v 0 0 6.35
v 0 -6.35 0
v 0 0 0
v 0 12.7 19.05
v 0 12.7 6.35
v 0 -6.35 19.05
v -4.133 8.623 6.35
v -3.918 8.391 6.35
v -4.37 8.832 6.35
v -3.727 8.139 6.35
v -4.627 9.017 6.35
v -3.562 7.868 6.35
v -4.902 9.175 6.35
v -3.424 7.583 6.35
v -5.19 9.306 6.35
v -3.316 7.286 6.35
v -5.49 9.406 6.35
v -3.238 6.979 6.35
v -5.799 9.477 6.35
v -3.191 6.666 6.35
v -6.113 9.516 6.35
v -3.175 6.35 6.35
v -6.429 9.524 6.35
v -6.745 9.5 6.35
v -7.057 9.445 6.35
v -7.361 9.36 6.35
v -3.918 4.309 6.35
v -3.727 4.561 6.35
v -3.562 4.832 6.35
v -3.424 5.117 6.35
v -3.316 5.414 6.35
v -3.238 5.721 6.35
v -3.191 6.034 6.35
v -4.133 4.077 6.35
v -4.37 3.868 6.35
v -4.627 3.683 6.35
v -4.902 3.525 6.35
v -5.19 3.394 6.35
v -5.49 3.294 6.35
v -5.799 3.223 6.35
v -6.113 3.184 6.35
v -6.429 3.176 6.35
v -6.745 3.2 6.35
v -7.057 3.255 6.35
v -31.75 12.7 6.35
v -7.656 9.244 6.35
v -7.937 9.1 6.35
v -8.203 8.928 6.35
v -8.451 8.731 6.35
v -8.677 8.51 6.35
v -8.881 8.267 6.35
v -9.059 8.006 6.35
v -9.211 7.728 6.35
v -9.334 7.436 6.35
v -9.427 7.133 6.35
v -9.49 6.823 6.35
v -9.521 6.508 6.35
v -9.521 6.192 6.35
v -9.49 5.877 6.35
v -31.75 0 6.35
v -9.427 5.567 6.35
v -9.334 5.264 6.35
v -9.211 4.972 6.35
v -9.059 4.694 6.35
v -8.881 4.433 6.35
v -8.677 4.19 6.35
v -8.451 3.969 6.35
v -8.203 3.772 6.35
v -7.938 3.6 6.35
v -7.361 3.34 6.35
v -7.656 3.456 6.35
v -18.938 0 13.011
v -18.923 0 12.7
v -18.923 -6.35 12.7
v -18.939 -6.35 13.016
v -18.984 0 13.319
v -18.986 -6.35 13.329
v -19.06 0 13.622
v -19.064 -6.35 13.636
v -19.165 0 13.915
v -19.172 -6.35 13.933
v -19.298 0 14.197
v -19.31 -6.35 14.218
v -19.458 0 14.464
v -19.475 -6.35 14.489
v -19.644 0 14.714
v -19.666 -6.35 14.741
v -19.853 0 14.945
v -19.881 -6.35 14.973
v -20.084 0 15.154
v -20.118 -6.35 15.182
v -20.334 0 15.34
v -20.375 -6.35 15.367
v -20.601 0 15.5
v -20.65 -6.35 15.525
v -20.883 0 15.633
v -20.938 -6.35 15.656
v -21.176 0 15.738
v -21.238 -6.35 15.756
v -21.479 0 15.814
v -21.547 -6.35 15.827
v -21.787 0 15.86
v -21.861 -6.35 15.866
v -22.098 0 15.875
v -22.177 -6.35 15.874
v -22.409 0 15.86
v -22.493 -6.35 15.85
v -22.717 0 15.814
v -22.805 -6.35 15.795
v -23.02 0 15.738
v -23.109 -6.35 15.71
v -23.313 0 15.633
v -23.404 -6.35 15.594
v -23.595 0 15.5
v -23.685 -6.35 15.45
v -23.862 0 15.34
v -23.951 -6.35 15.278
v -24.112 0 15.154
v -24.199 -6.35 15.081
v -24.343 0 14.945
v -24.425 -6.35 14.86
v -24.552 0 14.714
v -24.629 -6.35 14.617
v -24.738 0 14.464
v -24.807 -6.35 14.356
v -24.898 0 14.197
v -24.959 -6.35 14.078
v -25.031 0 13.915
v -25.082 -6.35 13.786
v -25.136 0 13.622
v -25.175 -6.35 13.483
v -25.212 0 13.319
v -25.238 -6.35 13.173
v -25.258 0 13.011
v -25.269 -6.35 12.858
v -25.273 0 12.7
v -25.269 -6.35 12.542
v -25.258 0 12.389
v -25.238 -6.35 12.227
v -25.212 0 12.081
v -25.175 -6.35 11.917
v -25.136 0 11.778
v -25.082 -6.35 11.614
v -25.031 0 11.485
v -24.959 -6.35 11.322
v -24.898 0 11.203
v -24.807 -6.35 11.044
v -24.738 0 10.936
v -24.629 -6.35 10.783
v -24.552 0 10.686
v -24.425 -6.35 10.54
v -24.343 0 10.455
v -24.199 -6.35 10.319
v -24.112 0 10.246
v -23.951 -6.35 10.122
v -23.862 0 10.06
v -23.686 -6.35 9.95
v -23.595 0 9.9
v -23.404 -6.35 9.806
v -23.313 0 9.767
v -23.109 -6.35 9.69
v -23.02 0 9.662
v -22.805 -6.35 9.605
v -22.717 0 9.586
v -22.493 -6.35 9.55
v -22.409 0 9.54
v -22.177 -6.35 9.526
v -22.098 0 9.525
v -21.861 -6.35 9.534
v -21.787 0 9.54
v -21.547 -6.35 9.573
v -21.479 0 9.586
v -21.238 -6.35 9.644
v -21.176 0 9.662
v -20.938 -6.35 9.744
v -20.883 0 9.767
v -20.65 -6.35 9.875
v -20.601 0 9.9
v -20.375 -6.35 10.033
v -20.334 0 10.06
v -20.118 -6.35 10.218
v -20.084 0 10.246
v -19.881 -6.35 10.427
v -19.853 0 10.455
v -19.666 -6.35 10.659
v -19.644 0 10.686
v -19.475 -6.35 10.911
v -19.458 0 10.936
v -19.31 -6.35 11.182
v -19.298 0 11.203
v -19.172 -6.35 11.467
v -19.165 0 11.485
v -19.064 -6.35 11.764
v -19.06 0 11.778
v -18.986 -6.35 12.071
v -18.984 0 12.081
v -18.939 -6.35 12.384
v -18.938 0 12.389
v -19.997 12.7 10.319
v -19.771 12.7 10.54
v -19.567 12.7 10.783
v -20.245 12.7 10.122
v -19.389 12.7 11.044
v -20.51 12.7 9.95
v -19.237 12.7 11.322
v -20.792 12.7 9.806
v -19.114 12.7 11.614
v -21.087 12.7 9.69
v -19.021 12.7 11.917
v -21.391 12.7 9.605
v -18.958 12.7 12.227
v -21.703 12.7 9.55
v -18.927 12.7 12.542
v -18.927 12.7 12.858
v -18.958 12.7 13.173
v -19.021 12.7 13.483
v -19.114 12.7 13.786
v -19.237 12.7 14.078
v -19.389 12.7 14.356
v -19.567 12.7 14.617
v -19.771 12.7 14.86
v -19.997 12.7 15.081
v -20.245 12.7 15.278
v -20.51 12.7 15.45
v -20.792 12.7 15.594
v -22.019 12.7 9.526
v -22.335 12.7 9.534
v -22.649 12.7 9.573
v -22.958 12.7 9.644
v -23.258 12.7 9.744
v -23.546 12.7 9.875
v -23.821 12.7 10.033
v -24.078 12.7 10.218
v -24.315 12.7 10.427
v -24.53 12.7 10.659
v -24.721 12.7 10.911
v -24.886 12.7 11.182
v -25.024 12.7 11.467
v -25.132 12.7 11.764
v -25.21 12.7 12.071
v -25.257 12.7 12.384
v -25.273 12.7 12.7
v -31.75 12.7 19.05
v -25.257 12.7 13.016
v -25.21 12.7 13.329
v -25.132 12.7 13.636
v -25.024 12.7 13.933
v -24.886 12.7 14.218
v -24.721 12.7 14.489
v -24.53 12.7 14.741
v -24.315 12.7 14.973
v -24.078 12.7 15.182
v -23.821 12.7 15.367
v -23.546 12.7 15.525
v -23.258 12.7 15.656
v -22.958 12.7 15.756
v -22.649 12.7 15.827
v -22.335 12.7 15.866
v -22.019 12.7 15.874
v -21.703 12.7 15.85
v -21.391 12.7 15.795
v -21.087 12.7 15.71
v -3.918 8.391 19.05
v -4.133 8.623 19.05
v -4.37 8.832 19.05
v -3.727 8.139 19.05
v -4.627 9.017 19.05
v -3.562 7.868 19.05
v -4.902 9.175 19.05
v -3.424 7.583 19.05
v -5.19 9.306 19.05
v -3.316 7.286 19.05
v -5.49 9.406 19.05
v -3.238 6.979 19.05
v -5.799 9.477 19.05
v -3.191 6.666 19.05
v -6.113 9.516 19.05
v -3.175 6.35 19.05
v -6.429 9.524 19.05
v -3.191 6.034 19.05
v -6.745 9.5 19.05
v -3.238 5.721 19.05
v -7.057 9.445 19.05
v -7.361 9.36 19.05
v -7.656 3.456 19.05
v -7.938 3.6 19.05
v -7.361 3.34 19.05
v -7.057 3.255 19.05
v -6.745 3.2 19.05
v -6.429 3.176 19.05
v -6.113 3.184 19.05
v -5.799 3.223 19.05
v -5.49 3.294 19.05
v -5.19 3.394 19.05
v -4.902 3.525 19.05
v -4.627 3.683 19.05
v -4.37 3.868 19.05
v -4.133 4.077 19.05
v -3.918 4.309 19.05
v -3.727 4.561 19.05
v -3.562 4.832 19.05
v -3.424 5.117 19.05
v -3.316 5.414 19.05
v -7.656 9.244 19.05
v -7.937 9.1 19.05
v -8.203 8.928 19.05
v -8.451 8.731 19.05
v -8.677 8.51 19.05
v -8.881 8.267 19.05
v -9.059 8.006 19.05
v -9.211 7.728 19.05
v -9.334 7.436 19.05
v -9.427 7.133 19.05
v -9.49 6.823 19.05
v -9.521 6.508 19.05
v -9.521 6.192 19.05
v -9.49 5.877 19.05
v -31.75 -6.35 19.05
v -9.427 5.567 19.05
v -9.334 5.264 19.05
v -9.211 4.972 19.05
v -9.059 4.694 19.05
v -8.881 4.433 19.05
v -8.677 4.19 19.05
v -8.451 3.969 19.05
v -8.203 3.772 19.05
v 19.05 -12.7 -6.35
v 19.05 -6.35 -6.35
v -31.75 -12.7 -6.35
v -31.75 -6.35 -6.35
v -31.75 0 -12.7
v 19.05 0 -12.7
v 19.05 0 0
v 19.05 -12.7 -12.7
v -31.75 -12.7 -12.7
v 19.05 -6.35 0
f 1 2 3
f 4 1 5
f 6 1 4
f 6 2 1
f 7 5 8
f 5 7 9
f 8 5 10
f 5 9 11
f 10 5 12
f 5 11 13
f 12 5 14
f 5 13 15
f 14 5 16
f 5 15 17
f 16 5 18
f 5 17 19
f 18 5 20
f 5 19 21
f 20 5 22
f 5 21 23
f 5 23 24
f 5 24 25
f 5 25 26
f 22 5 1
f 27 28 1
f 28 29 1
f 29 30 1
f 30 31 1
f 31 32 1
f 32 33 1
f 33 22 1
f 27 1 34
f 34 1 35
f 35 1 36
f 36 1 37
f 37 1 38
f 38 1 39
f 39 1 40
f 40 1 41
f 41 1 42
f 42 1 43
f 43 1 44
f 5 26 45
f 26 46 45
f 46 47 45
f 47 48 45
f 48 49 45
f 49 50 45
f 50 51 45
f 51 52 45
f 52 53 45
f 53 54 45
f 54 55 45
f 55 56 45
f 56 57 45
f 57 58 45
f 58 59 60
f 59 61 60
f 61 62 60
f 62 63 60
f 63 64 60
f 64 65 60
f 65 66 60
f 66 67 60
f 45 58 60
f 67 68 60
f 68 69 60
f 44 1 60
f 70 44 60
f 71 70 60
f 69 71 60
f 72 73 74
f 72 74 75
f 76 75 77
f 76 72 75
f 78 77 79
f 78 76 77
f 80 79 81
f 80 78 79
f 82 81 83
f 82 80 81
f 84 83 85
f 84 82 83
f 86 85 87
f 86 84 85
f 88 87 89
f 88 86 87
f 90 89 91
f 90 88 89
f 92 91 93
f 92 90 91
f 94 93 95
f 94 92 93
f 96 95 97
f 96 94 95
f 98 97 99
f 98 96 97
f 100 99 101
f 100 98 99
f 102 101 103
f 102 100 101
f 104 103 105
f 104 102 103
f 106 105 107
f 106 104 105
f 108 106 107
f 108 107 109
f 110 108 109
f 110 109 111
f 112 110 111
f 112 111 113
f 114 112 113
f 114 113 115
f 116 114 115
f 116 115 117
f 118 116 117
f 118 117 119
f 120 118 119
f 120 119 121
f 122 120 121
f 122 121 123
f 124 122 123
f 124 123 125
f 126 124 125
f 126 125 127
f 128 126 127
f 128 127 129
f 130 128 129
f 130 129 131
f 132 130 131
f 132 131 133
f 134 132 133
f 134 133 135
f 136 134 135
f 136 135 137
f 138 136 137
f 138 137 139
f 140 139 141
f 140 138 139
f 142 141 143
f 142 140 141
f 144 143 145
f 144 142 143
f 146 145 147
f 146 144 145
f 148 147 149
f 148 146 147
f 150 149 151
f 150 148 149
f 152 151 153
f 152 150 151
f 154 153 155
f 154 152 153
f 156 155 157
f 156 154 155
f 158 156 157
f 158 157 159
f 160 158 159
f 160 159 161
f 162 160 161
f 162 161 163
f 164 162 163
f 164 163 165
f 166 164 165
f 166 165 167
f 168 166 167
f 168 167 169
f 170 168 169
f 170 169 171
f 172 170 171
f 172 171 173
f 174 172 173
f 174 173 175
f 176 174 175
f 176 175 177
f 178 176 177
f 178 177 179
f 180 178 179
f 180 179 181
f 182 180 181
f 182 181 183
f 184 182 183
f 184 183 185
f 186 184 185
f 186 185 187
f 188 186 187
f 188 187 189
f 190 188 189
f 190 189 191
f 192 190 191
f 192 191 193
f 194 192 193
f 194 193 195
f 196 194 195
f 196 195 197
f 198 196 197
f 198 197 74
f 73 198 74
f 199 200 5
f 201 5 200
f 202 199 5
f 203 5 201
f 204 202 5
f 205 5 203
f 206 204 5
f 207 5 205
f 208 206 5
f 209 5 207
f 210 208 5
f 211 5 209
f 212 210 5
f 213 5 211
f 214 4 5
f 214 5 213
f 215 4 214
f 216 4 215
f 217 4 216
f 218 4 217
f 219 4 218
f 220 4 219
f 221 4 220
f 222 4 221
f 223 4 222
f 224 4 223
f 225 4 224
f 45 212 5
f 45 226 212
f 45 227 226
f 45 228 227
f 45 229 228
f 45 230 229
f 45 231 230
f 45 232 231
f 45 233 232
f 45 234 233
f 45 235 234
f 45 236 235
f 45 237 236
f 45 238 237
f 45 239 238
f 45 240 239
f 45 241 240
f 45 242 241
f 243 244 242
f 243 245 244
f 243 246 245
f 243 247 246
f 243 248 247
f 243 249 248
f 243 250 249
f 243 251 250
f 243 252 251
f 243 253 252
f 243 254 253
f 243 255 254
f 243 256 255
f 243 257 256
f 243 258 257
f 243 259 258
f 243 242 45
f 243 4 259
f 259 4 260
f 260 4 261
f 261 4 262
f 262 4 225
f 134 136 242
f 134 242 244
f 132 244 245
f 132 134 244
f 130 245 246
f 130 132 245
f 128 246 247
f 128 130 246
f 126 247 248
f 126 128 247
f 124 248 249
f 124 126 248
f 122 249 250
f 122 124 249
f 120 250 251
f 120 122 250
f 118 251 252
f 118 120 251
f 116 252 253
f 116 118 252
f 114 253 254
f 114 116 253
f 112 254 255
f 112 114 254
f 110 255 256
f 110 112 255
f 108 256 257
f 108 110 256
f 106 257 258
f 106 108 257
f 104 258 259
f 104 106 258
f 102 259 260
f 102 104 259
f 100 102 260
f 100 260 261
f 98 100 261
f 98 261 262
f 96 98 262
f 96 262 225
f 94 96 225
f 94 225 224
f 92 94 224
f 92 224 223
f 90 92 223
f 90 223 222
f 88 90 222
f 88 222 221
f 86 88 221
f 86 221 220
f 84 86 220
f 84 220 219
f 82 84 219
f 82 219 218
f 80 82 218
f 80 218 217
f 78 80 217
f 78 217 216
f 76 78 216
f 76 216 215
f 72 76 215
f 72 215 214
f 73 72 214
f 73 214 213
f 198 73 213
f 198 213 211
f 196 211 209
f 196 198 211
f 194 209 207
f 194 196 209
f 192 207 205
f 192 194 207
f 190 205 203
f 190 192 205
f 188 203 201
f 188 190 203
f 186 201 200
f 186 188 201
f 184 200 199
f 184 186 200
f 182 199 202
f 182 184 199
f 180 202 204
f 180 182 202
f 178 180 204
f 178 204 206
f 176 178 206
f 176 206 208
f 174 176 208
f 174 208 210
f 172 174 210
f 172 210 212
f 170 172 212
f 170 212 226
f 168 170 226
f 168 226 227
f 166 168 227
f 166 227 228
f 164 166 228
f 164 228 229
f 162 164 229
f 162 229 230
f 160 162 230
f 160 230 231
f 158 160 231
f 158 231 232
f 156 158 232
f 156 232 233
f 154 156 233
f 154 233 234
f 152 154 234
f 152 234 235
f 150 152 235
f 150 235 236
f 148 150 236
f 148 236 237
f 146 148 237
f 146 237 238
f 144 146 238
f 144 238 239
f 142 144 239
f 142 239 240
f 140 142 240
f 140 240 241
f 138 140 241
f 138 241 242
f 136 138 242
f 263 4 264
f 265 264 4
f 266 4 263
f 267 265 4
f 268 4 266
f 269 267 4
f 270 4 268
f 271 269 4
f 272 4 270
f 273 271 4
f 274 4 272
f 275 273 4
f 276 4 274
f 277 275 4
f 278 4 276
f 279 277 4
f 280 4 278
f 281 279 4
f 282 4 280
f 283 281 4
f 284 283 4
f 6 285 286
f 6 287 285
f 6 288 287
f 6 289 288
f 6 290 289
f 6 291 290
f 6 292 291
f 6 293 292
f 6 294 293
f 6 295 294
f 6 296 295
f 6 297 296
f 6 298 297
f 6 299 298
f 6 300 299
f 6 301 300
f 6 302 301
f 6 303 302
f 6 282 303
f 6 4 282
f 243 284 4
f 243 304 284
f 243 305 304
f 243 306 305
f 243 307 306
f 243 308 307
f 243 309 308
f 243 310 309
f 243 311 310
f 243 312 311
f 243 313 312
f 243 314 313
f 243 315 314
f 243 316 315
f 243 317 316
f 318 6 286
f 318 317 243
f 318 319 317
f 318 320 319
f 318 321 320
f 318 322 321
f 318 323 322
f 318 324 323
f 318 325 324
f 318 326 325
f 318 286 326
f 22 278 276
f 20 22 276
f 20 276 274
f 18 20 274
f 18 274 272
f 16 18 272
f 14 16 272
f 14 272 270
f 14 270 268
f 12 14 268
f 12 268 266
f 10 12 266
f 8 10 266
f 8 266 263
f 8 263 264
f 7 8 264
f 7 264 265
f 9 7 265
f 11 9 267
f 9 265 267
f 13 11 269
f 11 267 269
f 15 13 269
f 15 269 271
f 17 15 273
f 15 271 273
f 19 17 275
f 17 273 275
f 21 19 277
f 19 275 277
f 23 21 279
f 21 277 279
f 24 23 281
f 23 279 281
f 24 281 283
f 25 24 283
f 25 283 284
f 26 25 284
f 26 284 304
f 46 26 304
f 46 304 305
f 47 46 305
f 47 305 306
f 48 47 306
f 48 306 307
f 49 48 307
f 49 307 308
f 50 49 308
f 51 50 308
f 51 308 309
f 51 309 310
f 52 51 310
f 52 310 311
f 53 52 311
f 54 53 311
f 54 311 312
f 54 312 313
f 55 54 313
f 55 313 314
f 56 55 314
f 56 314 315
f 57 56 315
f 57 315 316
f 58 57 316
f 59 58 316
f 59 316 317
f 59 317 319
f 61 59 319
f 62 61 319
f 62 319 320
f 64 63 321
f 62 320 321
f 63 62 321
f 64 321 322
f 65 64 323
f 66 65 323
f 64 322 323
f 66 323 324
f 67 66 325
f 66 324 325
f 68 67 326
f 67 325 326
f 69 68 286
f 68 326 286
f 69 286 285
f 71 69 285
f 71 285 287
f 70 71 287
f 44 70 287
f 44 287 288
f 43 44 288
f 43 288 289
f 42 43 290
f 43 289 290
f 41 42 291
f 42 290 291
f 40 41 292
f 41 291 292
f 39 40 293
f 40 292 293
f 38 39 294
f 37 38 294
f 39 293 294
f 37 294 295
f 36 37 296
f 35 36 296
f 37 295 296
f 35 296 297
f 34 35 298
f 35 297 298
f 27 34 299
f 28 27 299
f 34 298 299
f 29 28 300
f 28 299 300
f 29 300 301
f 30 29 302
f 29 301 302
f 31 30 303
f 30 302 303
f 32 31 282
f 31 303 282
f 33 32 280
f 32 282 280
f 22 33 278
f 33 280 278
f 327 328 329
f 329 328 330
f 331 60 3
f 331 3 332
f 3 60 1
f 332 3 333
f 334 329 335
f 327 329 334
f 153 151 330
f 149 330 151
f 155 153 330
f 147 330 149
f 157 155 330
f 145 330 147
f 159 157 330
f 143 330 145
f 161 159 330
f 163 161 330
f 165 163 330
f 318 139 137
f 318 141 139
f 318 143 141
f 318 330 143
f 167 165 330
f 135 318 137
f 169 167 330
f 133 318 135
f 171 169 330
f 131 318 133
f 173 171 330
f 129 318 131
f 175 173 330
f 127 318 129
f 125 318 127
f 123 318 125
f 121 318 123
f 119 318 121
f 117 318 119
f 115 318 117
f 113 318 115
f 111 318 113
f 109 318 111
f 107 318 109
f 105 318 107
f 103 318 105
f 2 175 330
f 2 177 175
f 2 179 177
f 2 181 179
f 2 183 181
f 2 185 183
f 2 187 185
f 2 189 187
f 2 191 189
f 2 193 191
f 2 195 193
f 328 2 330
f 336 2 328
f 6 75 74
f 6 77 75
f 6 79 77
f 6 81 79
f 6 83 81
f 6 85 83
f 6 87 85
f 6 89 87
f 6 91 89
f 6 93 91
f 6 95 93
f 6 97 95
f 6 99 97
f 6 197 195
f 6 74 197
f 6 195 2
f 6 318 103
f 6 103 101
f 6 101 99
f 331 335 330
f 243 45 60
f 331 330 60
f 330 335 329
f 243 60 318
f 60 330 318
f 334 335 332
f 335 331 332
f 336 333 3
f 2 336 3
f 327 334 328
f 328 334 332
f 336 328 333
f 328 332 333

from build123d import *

# Parameters (mm, degrees)
F0_R     = 3.175
F1_DEPTH = 6.35
F3_DEPTH = 6.35
F4_W     = 31.75
F4_H     = 12.7
F4_R     = 3.175
F5_DEPTH = 12.7
F6_R     = 3.175
F7_DEPTH = 25.4


with BuildPart() as f1:
    # F0 (on Front) → F1 (new body)
    with BuildSketch(Plane.XZ):
        Polygon((19.05, 0), (0, 0), (0, 19.05), (-31.75, 19.05), (-31.75, -12.7), (19.05, -12.7), align=None)
        with Locations((-22.098, 12.7)):
            Circle(F0_R, mode=Mode.SUBTRACT)
    extrude(amount=F1_DEPTH)

    # F2 (on face) → F3 (join)
    with BuildSketch(Plane.XZ.offset(6.35)):
        Polygon((19.05, -6.35), (0, -6.35), (-31.75, -6.35), (-31.75, -12.7), (0, -12.7), (19.05, -12.7), align=None)
    extrude(amount=F3_DEPTH)

    # F4 (on face) → F5 (join)
    with BuildSketch(Plane(origin=(0, 0, 0), x_dir=(-1, 0, 0), z_dir=(0, 1, 0))):
        with Locations((15.875, 12.7)):
            Rectangle(F4_W, F4_H)
        with Locations((22.098, 12.7)):
            Circle(F4_R, mode=Mode.SUBTRACT)
    extrude(amount=F5_DEPTH)

    # F6 (on face) → F7 (cut)
    with BuildSketch(Plane.XY.offset(19.05)):
        with Locations((-6.35, 6.35)):
            Circle(F6_R)
    extrude(amount=-F7_DEPTH, mode=Mode.SUBTRACT)


solid = f1.part
